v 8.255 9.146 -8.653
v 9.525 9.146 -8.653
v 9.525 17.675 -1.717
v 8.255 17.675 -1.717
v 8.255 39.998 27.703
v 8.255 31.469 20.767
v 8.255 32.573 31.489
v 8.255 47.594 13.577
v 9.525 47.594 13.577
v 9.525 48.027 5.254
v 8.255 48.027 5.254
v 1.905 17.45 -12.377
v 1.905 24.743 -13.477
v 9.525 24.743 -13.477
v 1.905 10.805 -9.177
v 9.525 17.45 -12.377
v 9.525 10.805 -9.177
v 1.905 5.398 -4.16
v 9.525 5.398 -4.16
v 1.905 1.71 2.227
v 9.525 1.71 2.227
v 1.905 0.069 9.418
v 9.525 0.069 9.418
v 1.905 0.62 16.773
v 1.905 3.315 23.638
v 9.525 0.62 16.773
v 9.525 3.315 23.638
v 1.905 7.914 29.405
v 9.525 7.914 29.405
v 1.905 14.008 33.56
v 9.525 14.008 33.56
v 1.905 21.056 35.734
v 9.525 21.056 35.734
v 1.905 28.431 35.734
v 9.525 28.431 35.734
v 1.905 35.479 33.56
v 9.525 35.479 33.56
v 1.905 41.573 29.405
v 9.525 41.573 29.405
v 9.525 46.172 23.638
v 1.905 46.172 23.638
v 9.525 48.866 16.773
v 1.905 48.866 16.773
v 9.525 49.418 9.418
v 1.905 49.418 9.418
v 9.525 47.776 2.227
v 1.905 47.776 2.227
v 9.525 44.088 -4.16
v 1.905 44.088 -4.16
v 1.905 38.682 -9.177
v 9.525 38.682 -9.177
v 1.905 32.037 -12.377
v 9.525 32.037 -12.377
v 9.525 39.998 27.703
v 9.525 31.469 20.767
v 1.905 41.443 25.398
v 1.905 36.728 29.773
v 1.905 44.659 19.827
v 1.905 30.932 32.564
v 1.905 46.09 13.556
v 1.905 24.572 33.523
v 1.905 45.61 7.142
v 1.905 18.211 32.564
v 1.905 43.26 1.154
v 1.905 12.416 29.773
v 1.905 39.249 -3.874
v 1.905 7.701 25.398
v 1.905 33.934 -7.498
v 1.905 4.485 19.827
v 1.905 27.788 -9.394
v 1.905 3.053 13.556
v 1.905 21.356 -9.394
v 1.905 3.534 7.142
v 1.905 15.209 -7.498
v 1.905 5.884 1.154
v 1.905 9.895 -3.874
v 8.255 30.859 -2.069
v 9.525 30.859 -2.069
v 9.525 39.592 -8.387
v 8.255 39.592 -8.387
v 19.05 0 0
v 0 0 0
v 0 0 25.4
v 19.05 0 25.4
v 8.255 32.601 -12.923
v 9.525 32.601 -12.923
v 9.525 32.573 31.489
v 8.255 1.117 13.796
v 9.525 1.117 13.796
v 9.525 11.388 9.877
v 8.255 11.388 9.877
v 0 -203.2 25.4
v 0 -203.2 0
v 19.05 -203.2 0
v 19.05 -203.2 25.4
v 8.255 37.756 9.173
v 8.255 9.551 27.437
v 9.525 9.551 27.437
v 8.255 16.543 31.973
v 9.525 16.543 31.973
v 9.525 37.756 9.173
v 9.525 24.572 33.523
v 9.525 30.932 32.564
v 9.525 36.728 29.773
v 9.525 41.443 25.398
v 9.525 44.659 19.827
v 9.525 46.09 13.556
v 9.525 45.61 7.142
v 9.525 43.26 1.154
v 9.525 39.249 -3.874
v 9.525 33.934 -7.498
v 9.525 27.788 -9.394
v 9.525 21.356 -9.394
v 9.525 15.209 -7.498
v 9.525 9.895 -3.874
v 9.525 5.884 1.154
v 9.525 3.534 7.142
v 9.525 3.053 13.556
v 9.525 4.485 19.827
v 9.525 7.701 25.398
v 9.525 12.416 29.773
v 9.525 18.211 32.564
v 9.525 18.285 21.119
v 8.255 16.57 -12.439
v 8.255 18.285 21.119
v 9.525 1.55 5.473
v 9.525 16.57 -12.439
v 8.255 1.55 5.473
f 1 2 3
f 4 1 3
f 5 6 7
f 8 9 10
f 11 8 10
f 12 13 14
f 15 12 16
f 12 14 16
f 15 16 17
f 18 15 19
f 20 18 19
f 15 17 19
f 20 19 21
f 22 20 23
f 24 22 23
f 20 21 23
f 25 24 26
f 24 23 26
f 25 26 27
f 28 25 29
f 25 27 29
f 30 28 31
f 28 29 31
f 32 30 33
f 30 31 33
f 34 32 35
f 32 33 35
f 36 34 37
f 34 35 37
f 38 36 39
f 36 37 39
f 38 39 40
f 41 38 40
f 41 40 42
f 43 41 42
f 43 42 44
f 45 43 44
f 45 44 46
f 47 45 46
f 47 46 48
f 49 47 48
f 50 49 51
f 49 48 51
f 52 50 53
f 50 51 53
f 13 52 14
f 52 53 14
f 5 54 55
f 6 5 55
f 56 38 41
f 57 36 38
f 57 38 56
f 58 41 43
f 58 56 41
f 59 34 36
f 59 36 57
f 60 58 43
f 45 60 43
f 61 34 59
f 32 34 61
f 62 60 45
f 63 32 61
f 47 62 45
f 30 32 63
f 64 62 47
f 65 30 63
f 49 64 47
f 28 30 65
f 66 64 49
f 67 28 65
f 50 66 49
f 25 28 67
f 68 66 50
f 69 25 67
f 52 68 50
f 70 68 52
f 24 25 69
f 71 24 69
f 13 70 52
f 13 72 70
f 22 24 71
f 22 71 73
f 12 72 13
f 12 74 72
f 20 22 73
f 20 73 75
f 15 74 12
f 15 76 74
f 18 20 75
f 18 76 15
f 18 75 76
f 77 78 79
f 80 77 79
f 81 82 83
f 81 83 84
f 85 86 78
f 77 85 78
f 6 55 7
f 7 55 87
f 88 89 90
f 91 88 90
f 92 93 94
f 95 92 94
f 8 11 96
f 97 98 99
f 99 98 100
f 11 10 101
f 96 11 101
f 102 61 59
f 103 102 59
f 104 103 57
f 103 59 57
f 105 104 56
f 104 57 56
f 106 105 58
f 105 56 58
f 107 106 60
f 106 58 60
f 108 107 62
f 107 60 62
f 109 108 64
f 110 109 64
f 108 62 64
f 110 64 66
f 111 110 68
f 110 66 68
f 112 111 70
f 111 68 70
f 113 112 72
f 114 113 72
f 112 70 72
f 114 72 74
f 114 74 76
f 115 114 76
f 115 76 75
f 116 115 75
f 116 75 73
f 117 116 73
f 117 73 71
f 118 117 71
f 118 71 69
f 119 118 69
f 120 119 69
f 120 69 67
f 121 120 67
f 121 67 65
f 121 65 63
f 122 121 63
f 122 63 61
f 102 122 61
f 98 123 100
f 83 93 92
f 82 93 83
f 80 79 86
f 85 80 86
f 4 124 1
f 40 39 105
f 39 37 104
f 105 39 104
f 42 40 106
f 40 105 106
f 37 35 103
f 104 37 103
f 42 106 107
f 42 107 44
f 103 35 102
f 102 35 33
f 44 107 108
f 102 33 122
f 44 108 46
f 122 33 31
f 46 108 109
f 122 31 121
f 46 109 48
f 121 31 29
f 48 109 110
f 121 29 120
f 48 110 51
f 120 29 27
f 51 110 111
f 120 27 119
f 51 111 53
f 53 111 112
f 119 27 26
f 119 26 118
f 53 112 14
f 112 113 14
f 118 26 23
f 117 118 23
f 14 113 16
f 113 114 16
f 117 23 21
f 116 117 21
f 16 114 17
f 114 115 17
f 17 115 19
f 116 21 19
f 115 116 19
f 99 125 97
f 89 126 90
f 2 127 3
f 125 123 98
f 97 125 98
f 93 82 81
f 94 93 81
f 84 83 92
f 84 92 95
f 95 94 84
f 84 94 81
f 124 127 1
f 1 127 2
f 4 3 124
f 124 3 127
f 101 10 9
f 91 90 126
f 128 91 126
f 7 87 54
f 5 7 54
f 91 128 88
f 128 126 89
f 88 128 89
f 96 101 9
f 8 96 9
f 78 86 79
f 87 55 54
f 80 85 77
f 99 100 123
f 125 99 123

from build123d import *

# Parameters (mm, degrees)
SKETCH1_W             = 19.05
SKETCH1_H             = 203.2
BOSS_EXTRUDE1_DEPTH   = 25.4
SKETCH3_R             = 24.743349468
BOSS_EXTRUDE2_DEPTH   = 7.62
SKETCH4_R             = 21.578734867
CUT_EXTRUDE1_DEPTH    = 25.4
BOSS_EXTRUDE3_DEPTH   = 1.27
BOSS_EXTRUDE3_2_DEPTH = 1.27
BOSS_EXTRUDE3_3_DEPTH = 1.27
BOSS_EXTRUDE3_4_DEPTH = 1.27
BOSS_EXTRUDE3_5_DEPTH = 1.27
BOSS_EXTRUDE3_6_DEPTH = 1.27


with BuildPart() as part:
    # Sketch1 → Boss-Extrude1 (new body)
    with BuildSketch(Plane.XY):
        with Locations((9.525, -101.6)):
            Rectangle(SKETCH1_W, SKETCH1_H)
    extrude(amount=BOSS_EXTRUDE1_DEPTH)


with BuildPart() as body_2:
    # Sketch3 → Boss-Extrude2 (new body)
    with BuildSketch(Plane.ZY.offset(-9.525)):
        with Locations(Location((11.266756012, 24.743349468, 0), (0, 0, 180))):
            Circle(SKETCH3_R)
    extrude(amount=BOSS_EXTRUDE2_DEPTH)

    # Sketch4 → Cut-Extrude1 (cut)
    with BuildSketch(Plane.ZY.offset(-1.905)):
        with Locations((11.943841143, 24.571829641)):
            Circle(SKETCH4_R)
    extrude(amount=-CUT_EXTRUDE1_DEPTH, mode=Mode.SUBTRACT)


with BuildPart() as body_3:
    # Sketch5 → Boss-Extrude3 (new body)
    with BuildSketch(Plane.ZY.offset(-9.525)):
        Polygon((31.973200377, 16.542722148), (21.118827786, 18.284910257), (27.436601801, 9.551304828), align=None)
    extrude(amount=BOSS_EXTRUDE3_DEPTH)


with BuildPart() as body_4:
    # Sketch5 → Boss-Extrude3 2 (new body)
    with BuildSketch(Plane.ZY.offset(-9.525)):
        Polygon((13.79568913, 1.116564099), (9.877281995, 11.387820559), (5.472644835, 1.549665052), align=None)
    extrude(amount=BOSS_EXTRUDE3_2_DEPTH)


with BuildPart() as body_5:
    # Sketch5 → Boss-Extrude3 3 (new body)
    with BuildSketch(Plane.ZY.offset(-9.525)):
        Polygon((-8.652511246, 9.145671591), (-1.716545791, 17.674739943), (-12.438956966, 16.570189865), align=None)
    extrude(amount=BOSS_EXTRUDE3_3_DEPTH)


with BuildPart() as body_6:
    # Sketch5 → Boss-Extrude3 4 (new body)
    with BuildSketch(Plane.ZY.offset(-9.525)):
        Polygon((-12.923200377, 32.600937133), (-2.068827786, 30.858749025), (-8.386601801, 39.592354453), align=None)
    extrude(amount=BOSS_EXTRUDE3_4_DEPTH)


with BuildPart() as body_7:
    # Sketch5 → Boss-Extrude3 5 (new body)
    with BuildSketch(Plane.ZY.offset(-9.525)):
        Polygon((5.25431087, 48.027095182), (9.172718005, 37.755838723), (13.577355165, 47.593994229), align=None)
    extrude(amount=BOSS_EXTRUDE3_5_DEPTH)


with BuildPart() as body_8:
    # Sketch5 → Boss-Extrude3 6 (new body)
    with BuildSketch(Plane.ZY.offset(-9.525)):
        Polygon((27.702511246, 39.99798769), (20.766545791, 31.468919339), (31.488956966, 32.573469417), align=None)
    extrude(amount=BOSS_EXTRUDE3_6_DEPTH)


solid = Compound([part.part, body_2.part, body_3.part, body_4.part, body_5.part, body_6.part, body_7.part, body_8.part])
